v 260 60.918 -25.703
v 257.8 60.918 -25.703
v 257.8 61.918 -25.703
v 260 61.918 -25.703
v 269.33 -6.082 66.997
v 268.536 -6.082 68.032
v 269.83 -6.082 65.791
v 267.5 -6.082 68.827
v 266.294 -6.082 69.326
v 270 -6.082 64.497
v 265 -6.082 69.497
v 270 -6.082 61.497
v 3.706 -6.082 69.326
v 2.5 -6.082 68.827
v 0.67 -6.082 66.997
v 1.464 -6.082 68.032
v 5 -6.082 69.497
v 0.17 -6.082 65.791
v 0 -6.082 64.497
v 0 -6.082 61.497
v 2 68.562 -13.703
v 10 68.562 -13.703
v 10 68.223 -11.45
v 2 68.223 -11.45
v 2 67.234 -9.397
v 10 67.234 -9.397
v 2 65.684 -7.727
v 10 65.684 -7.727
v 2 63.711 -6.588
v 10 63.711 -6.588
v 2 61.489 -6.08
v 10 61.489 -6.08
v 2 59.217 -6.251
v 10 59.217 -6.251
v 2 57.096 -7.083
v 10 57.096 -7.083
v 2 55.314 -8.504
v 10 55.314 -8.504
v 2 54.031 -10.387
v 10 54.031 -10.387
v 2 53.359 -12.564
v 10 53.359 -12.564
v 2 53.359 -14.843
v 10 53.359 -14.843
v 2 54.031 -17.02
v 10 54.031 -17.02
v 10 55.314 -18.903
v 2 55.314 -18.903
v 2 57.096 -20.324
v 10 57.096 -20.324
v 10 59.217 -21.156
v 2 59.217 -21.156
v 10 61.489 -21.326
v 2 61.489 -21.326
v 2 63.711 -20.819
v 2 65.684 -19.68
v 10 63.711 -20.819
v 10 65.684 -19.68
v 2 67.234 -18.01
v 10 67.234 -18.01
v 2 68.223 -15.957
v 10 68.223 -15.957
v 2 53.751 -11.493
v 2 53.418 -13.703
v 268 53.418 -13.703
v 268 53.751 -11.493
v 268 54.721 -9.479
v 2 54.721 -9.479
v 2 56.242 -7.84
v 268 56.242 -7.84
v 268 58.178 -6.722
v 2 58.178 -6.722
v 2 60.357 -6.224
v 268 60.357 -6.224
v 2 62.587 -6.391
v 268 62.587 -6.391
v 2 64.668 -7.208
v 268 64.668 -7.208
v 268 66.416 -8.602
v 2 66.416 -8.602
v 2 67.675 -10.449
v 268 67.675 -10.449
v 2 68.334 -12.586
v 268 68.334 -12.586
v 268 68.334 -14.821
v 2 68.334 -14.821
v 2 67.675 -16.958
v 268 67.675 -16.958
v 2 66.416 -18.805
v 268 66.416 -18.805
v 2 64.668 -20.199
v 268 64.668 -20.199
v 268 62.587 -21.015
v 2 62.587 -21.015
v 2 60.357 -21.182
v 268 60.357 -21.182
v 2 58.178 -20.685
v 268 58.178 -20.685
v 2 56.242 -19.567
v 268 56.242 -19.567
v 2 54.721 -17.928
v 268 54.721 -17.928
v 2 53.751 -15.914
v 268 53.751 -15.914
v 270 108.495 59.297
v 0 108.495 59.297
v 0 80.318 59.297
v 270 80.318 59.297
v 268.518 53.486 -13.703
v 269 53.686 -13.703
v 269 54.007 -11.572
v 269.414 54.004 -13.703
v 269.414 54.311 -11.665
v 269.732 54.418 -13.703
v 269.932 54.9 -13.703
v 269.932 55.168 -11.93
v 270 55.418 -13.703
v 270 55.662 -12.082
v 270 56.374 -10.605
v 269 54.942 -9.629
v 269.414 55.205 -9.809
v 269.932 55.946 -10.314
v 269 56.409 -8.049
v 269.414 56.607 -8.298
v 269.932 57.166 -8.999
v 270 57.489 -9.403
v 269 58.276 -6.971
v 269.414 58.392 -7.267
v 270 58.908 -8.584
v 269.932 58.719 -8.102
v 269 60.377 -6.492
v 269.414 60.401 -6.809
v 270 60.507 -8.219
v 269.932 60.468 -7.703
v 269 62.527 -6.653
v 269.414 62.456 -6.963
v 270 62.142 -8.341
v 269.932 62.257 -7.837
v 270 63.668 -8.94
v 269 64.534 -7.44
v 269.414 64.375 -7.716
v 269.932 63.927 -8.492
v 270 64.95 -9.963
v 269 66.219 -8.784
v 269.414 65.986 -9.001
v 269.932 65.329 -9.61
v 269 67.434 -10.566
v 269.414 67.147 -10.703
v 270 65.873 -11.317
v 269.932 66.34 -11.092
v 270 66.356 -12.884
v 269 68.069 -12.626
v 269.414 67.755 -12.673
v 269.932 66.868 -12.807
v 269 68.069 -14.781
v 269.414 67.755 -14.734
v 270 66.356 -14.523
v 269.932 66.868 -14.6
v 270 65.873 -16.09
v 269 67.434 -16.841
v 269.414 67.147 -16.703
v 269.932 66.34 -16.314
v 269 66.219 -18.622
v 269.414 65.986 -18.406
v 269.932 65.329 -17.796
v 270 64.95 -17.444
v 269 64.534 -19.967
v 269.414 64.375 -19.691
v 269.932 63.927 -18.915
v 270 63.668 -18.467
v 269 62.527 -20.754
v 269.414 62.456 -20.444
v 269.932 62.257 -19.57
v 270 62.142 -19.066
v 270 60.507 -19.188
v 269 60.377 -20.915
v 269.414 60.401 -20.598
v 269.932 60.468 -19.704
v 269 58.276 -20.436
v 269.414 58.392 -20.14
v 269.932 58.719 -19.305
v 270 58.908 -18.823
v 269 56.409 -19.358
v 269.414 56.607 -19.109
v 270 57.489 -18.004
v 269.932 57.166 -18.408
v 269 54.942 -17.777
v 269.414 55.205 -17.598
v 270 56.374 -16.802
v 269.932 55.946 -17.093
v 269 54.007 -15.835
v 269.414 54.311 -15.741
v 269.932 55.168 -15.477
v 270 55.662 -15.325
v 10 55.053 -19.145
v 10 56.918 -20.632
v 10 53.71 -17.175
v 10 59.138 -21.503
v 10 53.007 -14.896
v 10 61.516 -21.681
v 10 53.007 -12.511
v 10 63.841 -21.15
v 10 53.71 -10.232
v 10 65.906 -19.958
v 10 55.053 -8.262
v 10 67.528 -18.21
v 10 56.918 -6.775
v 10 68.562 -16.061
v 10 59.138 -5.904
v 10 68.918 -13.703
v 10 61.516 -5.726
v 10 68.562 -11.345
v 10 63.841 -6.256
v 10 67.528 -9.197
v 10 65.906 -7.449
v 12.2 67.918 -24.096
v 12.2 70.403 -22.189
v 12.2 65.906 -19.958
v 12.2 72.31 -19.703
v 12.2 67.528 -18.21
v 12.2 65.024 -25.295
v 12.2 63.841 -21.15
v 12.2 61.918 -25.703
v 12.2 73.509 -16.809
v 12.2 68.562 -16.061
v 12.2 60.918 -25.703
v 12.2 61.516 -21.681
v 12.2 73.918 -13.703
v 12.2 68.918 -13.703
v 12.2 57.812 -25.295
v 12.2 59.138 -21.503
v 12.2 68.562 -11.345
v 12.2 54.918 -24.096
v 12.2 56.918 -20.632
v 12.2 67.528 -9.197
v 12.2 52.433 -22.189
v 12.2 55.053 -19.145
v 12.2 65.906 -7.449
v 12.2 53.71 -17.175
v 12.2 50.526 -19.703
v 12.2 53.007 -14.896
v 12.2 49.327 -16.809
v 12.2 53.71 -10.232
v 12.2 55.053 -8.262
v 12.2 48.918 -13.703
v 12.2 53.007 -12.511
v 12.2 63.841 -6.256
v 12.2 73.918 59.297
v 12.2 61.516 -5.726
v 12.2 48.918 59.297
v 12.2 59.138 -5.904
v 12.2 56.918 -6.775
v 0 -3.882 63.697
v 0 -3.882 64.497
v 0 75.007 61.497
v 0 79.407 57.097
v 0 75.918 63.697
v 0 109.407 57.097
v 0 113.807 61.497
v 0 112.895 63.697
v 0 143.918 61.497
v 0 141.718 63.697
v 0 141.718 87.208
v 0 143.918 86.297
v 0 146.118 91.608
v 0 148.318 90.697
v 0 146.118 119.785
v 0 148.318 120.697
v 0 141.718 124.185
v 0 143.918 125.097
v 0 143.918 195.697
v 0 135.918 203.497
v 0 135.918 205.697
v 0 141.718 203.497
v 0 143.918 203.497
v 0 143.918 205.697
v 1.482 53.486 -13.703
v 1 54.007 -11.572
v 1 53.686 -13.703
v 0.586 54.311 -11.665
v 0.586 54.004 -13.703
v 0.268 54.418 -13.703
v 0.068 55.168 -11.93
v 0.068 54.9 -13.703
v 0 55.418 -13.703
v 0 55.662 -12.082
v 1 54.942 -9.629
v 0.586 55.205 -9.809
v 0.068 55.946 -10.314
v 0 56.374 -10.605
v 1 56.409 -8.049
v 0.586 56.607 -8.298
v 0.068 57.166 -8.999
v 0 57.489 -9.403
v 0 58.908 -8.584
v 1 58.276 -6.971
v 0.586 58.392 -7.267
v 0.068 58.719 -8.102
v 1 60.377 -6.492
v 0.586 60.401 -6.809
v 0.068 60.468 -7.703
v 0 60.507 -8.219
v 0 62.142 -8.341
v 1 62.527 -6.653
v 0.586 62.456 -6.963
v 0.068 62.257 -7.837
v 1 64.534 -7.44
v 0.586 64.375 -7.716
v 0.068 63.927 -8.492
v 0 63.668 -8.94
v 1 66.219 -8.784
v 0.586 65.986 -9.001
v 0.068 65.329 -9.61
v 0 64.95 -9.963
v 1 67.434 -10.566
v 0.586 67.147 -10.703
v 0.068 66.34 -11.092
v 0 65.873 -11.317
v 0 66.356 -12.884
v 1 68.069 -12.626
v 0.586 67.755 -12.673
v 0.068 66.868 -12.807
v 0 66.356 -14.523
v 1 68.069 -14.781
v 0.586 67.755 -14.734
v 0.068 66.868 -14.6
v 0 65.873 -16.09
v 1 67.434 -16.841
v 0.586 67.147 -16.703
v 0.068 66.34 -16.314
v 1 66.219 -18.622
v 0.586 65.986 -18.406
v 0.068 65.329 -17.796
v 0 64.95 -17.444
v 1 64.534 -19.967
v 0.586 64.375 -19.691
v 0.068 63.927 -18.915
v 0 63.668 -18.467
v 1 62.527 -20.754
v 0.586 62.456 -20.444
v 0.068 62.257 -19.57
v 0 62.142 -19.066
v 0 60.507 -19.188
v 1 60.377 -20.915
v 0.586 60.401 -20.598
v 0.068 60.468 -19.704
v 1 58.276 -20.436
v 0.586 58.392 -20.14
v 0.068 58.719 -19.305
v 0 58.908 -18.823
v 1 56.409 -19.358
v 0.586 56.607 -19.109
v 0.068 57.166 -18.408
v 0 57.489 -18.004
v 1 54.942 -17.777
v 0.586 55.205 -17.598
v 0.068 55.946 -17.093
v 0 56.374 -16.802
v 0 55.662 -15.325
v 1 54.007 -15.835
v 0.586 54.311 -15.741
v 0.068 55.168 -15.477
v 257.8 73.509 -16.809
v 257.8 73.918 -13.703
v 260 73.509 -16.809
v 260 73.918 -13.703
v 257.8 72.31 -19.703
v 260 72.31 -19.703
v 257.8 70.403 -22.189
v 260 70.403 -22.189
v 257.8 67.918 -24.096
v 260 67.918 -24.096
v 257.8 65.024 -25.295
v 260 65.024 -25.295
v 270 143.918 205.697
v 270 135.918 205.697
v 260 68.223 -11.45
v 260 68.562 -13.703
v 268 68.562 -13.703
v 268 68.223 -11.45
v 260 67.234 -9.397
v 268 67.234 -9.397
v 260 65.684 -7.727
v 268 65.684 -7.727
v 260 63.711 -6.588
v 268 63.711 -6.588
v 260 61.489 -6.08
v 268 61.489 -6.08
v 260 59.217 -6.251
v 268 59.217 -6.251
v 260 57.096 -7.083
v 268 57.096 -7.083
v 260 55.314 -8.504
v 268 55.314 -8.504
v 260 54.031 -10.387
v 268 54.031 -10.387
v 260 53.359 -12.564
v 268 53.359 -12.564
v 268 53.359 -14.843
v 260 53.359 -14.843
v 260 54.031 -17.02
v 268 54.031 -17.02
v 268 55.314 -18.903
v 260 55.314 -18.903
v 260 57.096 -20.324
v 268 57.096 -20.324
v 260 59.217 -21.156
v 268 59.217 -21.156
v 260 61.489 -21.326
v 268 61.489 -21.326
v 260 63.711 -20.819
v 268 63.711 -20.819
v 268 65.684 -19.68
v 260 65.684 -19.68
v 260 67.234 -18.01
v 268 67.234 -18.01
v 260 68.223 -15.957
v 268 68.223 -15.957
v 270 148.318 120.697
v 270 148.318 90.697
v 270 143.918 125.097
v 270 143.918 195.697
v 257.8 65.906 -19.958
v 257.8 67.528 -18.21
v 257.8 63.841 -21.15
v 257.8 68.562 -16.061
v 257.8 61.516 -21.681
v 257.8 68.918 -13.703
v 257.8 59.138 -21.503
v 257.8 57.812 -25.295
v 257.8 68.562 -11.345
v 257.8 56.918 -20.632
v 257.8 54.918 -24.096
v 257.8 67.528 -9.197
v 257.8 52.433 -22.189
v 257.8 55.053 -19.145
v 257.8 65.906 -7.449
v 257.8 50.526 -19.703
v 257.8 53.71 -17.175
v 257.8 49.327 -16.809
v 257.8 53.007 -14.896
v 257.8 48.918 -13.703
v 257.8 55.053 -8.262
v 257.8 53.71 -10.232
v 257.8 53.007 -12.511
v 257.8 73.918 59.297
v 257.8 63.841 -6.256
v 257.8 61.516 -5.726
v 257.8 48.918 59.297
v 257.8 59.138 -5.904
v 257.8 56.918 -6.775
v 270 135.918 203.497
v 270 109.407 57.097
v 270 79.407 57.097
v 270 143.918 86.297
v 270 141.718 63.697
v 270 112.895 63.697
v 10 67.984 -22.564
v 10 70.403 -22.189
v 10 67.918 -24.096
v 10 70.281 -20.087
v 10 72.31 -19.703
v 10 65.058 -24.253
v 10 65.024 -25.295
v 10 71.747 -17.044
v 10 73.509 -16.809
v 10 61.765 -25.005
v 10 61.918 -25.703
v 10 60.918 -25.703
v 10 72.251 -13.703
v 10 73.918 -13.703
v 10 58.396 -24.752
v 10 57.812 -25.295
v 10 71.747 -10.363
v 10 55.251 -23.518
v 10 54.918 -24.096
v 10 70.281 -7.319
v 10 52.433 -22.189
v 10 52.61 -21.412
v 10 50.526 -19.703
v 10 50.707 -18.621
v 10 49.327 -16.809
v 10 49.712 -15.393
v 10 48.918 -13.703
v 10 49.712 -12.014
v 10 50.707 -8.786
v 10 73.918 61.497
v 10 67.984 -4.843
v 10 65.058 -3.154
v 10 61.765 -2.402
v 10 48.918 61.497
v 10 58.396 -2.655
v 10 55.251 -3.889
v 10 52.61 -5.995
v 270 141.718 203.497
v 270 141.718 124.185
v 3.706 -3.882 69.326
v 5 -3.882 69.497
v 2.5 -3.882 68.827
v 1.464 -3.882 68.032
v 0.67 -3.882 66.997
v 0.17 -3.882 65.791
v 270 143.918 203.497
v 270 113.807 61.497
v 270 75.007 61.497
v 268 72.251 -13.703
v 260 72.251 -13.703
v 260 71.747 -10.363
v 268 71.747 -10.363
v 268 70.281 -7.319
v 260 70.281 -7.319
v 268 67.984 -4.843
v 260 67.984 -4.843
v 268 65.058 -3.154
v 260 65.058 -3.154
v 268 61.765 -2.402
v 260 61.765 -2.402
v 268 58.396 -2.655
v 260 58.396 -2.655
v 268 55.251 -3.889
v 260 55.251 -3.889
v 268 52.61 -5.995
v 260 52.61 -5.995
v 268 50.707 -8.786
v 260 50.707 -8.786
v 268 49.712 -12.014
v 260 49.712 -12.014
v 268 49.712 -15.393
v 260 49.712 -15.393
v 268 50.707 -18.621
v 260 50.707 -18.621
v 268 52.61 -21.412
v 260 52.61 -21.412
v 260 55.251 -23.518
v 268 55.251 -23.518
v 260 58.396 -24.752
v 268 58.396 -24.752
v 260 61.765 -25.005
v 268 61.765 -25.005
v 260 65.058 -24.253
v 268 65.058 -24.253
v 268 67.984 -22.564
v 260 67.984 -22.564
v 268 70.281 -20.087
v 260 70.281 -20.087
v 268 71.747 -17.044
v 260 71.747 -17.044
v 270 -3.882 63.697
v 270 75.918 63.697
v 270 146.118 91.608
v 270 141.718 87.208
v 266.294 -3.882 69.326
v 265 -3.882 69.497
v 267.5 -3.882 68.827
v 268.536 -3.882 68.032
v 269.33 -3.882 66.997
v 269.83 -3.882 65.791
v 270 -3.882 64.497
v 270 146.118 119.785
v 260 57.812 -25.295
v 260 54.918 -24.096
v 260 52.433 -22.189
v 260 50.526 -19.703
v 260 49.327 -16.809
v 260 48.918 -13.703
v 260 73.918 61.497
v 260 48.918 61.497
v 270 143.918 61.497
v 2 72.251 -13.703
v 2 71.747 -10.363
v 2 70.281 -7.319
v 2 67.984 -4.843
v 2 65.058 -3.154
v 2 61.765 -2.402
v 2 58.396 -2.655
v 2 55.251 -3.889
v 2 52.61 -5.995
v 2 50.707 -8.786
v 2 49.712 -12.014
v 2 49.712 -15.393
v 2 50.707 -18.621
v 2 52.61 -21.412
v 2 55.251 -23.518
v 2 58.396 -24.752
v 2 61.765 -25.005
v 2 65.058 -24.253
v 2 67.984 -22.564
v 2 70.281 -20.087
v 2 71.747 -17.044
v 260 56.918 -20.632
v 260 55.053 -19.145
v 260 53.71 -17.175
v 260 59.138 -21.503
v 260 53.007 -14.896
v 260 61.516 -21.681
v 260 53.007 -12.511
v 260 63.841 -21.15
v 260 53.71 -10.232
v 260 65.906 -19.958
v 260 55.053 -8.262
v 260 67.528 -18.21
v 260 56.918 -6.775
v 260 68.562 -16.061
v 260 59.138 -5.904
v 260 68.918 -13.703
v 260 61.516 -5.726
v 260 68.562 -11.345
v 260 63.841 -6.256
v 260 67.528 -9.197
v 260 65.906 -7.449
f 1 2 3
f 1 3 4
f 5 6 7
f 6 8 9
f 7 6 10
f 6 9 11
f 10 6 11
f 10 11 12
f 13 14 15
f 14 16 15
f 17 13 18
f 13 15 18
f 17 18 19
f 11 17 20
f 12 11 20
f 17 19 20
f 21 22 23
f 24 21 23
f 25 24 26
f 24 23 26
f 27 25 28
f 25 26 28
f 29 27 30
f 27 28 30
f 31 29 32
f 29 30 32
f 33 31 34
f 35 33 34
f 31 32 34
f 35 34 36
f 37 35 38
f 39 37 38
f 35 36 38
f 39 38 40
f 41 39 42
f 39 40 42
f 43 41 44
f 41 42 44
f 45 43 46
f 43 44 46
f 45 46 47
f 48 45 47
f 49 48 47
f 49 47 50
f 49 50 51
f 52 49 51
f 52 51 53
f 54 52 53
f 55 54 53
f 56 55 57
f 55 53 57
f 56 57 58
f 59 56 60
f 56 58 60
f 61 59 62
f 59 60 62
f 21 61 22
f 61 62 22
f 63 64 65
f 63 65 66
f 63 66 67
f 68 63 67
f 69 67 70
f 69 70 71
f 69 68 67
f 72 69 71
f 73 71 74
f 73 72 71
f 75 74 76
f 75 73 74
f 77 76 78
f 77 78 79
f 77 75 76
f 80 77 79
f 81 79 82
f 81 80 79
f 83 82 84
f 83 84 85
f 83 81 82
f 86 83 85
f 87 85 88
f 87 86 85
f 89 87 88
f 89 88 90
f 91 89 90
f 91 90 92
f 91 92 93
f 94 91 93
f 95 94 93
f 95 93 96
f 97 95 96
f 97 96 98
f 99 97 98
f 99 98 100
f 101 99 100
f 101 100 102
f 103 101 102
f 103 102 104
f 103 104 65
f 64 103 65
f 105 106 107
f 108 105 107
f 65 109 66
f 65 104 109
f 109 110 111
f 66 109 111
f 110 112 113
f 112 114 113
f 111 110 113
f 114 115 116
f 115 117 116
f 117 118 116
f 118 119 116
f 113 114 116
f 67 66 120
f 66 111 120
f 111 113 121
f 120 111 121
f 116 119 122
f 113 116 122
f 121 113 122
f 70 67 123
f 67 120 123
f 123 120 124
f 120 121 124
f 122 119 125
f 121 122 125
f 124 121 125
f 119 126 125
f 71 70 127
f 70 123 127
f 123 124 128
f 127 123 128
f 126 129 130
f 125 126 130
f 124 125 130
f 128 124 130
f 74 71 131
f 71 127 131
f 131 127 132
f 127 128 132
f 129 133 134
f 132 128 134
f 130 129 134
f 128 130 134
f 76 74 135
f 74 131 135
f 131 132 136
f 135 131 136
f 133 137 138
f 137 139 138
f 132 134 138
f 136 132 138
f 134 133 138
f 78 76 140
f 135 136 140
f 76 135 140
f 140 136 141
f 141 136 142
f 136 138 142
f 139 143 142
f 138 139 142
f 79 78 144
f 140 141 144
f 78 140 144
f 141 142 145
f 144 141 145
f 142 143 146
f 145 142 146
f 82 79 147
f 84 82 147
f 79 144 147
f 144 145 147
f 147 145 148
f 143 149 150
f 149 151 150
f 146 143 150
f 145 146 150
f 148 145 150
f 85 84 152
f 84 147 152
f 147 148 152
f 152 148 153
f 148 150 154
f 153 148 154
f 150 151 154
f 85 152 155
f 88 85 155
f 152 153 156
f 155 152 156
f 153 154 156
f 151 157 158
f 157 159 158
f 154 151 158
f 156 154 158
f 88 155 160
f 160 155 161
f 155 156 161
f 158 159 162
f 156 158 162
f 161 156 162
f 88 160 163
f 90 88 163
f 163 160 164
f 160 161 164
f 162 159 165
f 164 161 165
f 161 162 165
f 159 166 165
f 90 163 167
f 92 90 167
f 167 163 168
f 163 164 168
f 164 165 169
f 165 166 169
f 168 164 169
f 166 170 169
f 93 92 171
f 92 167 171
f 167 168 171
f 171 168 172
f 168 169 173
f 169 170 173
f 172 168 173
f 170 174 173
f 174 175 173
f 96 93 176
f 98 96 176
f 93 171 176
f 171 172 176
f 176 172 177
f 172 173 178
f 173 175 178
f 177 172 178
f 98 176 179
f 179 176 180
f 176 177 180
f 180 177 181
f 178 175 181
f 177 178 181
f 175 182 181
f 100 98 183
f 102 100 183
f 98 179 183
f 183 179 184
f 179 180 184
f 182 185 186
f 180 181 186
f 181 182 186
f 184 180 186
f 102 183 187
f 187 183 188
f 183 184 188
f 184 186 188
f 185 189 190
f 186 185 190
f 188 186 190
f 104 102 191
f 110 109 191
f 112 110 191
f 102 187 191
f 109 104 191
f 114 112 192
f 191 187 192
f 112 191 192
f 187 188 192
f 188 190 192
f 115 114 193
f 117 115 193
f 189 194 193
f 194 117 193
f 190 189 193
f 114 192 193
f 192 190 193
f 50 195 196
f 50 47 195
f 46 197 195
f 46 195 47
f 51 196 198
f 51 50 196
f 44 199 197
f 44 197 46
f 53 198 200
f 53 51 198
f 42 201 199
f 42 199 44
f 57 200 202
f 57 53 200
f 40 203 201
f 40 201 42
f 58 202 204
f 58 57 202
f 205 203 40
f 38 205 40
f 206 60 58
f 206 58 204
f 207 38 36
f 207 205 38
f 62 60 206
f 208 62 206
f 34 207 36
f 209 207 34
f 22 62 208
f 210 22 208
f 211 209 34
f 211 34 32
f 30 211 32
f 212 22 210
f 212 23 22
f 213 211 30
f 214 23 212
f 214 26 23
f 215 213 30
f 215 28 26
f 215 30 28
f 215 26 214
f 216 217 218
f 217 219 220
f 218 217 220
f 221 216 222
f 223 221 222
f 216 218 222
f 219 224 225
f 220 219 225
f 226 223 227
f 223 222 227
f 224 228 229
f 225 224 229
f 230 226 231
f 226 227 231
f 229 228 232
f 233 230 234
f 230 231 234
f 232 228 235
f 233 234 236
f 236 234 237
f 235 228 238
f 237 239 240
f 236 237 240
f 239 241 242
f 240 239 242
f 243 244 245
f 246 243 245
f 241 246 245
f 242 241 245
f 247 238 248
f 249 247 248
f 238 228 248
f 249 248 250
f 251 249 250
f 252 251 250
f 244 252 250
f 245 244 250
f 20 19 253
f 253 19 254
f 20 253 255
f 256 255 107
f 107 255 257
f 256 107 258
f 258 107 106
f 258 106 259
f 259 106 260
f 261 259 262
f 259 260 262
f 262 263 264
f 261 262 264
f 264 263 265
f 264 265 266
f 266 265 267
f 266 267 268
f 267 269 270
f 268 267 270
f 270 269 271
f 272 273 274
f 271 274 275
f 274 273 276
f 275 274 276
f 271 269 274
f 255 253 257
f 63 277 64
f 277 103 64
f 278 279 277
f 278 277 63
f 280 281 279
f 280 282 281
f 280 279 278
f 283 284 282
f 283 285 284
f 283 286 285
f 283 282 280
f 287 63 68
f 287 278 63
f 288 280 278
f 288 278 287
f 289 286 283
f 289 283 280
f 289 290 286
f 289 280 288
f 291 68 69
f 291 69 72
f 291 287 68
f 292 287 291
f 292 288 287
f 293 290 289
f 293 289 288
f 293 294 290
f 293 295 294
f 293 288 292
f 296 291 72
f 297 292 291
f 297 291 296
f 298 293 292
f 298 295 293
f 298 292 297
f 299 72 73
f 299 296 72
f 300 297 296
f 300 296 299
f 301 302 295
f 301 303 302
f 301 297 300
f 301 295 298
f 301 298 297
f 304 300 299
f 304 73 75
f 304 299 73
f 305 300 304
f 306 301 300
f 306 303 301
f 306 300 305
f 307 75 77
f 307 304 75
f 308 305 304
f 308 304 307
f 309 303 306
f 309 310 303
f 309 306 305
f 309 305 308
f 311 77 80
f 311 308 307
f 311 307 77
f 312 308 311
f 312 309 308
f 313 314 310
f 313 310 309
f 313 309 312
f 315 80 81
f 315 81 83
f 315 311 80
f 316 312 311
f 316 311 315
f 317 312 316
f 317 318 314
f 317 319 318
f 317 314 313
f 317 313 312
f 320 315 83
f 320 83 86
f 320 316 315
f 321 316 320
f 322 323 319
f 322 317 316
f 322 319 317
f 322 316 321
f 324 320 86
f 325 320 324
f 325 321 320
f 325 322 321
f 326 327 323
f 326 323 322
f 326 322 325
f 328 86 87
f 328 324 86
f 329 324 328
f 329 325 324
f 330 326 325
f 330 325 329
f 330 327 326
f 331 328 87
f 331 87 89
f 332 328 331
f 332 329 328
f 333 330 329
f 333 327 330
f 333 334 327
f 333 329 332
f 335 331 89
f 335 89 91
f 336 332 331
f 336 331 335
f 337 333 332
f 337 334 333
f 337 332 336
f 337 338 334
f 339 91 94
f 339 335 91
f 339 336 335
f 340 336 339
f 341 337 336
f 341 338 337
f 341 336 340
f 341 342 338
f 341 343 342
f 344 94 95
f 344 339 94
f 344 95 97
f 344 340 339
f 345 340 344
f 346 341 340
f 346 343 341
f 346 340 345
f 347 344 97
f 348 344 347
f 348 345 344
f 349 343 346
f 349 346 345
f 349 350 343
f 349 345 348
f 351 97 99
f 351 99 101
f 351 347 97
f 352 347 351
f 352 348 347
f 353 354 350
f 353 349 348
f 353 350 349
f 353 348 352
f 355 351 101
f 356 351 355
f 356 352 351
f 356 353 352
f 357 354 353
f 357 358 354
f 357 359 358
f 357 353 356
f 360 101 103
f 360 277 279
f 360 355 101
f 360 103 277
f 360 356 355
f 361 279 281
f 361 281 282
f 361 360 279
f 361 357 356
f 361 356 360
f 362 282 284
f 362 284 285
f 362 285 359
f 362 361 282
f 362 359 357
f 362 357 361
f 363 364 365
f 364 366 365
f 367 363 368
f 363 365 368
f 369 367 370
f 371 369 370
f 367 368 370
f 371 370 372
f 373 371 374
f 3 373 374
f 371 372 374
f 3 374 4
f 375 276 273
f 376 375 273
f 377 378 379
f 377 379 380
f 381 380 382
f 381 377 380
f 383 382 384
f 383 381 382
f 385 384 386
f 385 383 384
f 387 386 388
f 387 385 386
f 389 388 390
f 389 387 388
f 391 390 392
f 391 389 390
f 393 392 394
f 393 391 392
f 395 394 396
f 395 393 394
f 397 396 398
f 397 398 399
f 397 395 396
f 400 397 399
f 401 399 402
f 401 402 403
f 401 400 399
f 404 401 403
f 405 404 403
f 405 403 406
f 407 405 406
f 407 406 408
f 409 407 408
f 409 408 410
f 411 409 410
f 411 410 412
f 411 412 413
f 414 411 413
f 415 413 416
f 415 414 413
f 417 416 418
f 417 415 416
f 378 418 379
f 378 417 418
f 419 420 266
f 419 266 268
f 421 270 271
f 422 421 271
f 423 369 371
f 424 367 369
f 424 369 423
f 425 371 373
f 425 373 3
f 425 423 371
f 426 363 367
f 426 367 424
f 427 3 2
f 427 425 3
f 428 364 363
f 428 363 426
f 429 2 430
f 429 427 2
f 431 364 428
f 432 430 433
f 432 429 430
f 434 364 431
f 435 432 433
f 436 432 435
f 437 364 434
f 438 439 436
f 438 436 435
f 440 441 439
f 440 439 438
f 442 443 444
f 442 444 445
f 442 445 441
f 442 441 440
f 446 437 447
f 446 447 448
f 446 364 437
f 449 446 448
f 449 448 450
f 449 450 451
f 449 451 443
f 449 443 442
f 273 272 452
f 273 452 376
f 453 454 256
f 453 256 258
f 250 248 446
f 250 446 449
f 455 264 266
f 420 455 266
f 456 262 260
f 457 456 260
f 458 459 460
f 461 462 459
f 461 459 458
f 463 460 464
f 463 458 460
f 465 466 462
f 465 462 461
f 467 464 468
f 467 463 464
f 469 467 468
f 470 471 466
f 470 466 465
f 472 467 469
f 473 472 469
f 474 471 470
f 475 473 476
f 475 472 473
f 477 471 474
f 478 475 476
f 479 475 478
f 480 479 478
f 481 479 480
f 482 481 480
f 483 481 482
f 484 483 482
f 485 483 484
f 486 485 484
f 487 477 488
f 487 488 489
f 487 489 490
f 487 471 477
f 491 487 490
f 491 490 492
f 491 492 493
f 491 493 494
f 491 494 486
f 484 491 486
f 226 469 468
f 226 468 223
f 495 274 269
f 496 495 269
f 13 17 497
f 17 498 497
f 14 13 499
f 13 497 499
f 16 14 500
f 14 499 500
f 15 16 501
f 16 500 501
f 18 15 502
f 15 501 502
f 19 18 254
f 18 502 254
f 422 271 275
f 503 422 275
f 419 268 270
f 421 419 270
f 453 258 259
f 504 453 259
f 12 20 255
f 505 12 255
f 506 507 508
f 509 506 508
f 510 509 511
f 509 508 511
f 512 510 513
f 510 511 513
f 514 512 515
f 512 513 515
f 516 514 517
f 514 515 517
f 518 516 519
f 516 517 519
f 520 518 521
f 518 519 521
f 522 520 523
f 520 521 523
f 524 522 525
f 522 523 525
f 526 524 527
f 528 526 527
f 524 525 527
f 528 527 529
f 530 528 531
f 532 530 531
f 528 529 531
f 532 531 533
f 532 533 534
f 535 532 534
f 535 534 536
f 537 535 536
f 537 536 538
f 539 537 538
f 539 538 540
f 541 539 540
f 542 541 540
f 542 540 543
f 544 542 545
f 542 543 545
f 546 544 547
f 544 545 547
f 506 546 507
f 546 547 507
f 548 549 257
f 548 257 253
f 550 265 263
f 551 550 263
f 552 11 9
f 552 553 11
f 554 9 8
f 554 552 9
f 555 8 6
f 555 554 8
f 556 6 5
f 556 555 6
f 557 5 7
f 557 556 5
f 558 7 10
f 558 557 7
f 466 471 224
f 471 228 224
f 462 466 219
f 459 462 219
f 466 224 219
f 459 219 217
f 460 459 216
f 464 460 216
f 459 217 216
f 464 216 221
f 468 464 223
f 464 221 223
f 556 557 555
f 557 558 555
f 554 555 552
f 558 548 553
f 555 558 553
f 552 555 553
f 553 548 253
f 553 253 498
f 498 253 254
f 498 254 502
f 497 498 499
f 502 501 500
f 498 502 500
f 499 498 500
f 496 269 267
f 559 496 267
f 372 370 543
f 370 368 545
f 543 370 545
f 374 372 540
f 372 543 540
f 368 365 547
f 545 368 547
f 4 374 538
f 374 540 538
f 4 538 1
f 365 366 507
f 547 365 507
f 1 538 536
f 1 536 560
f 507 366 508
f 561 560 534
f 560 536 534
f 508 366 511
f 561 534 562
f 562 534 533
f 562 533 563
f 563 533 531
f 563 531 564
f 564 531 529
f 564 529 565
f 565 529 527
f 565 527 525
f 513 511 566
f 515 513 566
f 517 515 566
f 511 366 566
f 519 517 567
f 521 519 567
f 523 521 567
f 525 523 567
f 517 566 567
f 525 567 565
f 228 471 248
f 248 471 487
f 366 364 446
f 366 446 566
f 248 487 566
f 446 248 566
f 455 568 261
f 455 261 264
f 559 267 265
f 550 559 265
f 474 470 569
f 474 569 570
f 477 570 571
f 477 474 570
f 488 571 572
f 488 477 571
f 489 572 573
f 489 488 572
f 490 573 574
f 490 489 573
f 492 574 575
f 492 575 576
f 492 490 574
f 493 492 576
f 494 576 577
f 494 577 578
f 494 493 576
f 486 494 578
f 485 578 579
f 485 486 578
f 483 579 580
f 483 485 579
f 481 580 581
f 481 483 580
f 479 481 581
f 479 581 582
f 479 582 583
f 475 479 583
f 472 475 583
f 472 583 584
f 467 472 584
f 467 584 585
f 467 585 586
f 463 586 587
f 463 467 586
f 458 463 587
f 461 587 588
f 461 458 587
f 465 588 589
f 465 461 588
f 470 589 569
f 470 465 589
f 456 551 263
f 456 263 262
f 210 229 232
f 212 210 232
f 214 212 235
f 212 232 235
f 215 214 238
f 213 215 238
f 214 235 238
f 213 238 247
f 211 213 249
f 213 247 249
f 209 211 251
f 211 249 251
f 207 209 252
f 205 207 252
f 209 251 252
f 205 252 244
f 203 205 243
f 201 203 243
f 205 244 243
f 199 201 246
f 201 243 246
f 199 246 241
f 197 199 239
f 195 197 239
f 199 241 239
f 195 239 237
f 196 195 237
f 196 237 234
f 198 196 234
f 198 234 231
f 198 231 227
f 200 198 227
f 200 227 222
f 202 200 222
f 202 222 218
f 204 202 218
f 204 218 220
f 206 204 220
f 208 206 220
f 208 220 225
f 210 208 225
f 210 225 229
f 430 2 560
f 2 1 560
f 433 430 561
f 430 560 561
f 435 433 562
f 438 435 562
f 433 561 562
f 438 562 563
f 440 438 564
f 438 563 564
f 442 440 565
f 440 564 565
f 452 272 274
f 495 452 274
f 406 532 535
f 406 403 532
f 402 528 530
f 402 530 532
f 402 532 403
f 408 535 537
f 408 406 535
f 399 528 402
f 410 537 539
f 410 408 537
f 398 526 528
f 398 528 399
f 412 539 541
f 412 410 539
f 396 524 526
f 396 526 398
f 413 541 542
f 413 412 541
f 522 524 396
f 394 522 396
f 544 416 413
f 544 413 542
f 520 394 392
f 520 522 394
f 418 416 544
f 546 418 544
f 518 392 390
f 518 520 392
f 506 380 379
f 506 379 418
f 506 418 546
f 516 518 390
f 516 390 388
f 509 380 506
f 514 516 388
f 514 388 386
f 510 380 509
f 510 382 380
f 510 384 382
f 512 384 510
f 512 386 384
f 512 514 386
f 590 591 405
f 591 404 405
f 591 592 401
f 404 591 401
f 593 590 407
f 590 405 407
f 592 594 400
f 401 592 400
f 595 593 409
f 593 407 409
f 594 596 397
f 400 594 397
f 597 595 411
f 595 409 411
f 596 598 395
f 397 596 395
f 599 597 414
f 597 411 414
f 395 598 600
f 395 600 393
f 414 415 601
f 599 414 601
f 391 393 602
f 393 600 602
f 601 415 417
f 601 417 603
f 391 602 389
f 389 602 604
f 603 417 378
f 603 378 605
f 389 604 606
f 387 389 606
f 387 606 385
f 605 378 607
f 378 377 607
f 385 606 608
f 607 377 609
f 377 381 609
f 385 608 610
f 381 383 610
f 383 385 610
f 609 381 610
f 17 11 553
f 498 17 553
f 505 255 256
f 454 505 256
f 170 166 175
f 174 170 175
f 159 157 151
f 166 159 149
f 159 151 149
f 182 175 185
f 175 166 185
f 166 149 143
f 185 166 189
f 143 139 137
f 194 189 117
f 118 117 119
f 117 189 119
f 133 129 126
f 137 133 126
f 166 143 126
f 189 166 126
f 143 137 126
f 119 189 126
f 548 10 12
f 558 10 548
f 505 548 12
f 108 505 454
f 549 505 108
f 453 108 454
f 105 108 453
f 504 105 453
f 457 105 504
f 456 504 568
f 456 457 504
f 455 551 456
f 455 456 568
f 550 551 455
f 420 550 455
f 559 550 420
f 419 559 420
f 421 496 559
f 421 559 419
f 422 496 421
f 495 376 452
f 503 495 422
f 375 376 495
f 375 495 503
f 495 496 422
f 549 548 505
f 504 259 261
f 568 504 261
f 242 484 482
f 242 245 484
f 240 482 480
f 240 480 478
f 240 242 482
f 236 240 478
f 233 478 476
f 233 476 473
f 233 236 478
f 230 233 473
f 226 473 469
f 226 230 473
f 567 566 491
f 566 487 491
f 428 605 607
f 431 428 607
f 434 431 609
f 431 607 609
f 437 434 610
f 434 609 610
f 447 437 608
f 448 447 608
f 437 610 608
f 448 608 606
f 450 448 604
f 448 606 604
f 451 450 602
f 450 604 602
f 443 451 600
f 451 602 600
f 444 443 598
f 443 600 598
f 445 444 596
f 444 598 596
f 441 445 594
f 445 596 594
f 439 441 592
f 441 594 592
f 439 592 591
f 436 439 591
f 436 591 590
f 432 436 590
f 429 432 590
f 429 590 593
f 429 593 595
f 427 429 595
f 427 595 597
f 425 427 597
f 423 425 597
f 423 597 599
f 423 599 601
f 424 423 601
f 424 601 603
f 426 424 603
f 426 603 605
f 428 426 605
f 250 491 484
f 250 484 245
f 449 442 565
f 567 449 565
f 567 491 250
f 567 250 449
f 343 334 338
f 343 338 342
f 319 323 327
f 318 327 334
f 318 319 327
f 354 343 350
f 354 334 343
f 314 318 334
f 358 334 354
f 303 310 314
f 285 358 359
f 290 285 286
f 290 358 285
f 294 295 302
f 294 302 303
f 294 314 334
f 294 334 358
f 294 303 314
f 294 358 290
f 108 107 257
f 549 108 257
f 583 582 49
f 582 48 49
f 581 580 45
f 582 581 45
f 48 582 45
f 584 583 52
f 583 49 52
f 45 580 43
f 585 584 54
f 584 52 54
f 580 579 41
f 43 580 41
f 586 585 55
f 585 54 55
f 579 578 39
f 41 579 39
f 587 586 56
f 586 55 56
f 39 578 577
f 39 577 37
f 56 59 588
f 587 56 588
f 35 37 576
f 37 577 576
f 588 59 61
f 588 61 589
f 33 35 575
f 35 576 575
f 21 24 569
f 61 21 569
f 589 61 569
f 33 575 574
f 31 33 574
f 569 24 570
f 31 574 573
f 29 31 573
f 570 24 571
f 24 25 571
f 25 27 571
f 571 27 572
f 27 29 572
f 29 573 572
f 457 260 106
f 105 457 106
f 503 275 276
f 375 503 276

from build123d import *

# Parameters (mm, degrees)
F0_W           = 2.200000473
F0_H           = 2.2
F0_W_2         = 5.799999054
F0_W_3         = 2.2
F0_H_2         = 5.8
F1_DEPTH       = 270
F3_W           = 25
F3_H           = 2.2
F4_DEPTH       = 125
F4_DEPTH_BACK  = 125
F5_W           = 2.2
F5_H           = 25
F6_DEPTH       = 85
F7_R           = 12
F8_R           = 8
F9_DEPTH       = 260.001
F10_R          = 5
F11_R          = 7.5
F12_DEPTH      = 135
F12_DEPTH_BACK = 135
F13_R          = 2
F14_R          = 11.3327676894
F14_R_2        = 7.6443567425
F15_DEPTH      = 8


# Not quite as in the source:
# - ends of sketch curves that miss each other by under 0.0002 mm in the source are joined


with BuildPart() as f1:
    # F0 (on Right) → F1 (new body)
    with BuildSketch(Plane.YZ):
        Polygon((148.3178712445, 90.6965444131), (148.3178712445, 120.6965444131), (143.9178712445, 125.0965444131), (143.9178712445, 195.6965444131), (143.9178716134, 203.4965444131), (141.7178712445, 203.4965444131), (141.7178712445, 124.1852745758), (146.1178712445, 119.7852745758), (146.1178712445, 91.6078142503), (141.7178712445, 87.2078142503), (141.7178712445, 63.6965476274), (143.9178712445, 63.6965476274), (143.9178712445, 86.2965444131), align=None)
        Polygon((143.9178712445, 61.4965476274), (143.9178712445, 63.6965476274), (141.7178712445, 63.6965476274), (112.89533157, 63.6965476274), (108.49533157, 59.2965476274), (80.3178712445, 59.2965476274), (75.9178712445, 63.6965476274), (-3.8821287555, 63.6965476274), (-3.8821287555, 61.4965476274), (75.0066014072, 61.4965476274), (79.4066014072, 57.0965476274), (109.4066014072, 57.0965476274), (113.8066014072, 61.4965476274), align=None)
        with Locations((142.817871481, 204.5965444131)):
            Rectangle(F0_W, F0_H)
        with Locations((138.8178717175, 204.5965444131)):
            Rectangle(F0_W_2, F0_H)
        with Locations((-4.9821287555, 66.5965476274)):
            Rectangle(F0_W_3, F0_H_2)
        with Locations((-4.9821287555, 62.5965476274)):
            Rectangle(F0_W_3, F0_H)
    extrude(amount=F1_DEPTH)

    # F10
    f10_edges = [f1.edges().sort_by_distance(p)[0] for p in [
        (270, -4.982129, 69.496548),
        (0, -4.982129, 69.496548),
    ]]
    fillet(f10_edges, radius=F10_R)


with BuildPart() as f4:
    # F3 (on offset) → F4 (new body, two sides)
    with BuildSketch(Plane(origin=(135, 0, 0), x_dir=(0, -1, 0), z_dir=(-1, 0, 0))) as f4_sk:
        with Locations((-61.4178712445, 60.3965476274)):
            Rectangle(F3_W, F3_H)
    extrude(amount=F4_DEPTH)
    extrude(f4_sk.sketch, amount=-F4_DEPTH_BACK)

    # F5 (on face) → F6 (join)
    with BuildSketch(Plane(origin=(0, 0, 59.2965476274), x_dir=(1, 0, 0), z_dir=(0, 0, -1))):
        with Locations((11.1, -61.4178712445)):
            Rectangle(F5_W, F5_H)
        with Locations((258.9, -61.4178712445)):
            Rectangle(F5_W, F5_H)
    extrude(amount=F6_DEPTH)

    # F7
    f7_edges = [f4.edges().sort_by_distance(p)[0] for p in [
        (258.9, 48.917871, -25.703452),
        (258.9, 73.917871, -25.703452),
        (11.1, 48.917871, -25.703452),
        (11.1, 73.917871, -25.703452),
    ]]
    fillet(f7_edges, radius=F7_R)

    # F8 (on face) → F9 (cut, through all)
    with BuildSketch(Plane.YZ.offset(260)):
        with Locations((60.9178712445, -13.7034523726)):
            Circle(F8_R)
    extrude(amount=-F9_DEPTH, mode=Mode.SUBTRACT)

    # F14 (on face) → F15 (join)
    with BuildSketch(Plane.YZ.offset(260)):
        with Locations((60.9178712445, -13.7034523726)):
            Circle(F14_R)
        with Locations((60.9178712445, -13.7034523726)):
            Circle(F14_R_2, mode=Mode.SUBTRACT)
    extrude(amount=F15_DEPTH)

    # F16: F4 across plane


with BuildPart() as f12:
    # F11 (on offset) → F12 (new body, two sides)
    with BuildSketch(Plane(origin=(135, 0, 0), x_dir=(0, -1, 0), z_dir=(-1, 0, 0))) as f12_sk:
        with Locations((-60.9178712445, -13.7034523726)):
            Circle(F11_R)
    extrude(amount=F12_DEPTH)
    extrude(f12_sk.sketch, amount=-F12_DEPTH_BACK)

    # F13
    f13_edges = [f12.edges().sort_by_distance(p)[0] for p in [
        (270, 68.417871, -13.703452),
        (0, 68.417871, -13.703452),
    ]]
    fillet(f13_edges, radius=F13_R)


with BuildPart() as f4_1:
    add(f4.part)
    add(f4.part.mirror(Plane(origin=(135, 104.2623457429, 98.2578018151), x_dir=(0, 1, 0), z_dir=(-1, 0, 0))))


solid = Compound([f1.part, f12.part, f4_1.part])
